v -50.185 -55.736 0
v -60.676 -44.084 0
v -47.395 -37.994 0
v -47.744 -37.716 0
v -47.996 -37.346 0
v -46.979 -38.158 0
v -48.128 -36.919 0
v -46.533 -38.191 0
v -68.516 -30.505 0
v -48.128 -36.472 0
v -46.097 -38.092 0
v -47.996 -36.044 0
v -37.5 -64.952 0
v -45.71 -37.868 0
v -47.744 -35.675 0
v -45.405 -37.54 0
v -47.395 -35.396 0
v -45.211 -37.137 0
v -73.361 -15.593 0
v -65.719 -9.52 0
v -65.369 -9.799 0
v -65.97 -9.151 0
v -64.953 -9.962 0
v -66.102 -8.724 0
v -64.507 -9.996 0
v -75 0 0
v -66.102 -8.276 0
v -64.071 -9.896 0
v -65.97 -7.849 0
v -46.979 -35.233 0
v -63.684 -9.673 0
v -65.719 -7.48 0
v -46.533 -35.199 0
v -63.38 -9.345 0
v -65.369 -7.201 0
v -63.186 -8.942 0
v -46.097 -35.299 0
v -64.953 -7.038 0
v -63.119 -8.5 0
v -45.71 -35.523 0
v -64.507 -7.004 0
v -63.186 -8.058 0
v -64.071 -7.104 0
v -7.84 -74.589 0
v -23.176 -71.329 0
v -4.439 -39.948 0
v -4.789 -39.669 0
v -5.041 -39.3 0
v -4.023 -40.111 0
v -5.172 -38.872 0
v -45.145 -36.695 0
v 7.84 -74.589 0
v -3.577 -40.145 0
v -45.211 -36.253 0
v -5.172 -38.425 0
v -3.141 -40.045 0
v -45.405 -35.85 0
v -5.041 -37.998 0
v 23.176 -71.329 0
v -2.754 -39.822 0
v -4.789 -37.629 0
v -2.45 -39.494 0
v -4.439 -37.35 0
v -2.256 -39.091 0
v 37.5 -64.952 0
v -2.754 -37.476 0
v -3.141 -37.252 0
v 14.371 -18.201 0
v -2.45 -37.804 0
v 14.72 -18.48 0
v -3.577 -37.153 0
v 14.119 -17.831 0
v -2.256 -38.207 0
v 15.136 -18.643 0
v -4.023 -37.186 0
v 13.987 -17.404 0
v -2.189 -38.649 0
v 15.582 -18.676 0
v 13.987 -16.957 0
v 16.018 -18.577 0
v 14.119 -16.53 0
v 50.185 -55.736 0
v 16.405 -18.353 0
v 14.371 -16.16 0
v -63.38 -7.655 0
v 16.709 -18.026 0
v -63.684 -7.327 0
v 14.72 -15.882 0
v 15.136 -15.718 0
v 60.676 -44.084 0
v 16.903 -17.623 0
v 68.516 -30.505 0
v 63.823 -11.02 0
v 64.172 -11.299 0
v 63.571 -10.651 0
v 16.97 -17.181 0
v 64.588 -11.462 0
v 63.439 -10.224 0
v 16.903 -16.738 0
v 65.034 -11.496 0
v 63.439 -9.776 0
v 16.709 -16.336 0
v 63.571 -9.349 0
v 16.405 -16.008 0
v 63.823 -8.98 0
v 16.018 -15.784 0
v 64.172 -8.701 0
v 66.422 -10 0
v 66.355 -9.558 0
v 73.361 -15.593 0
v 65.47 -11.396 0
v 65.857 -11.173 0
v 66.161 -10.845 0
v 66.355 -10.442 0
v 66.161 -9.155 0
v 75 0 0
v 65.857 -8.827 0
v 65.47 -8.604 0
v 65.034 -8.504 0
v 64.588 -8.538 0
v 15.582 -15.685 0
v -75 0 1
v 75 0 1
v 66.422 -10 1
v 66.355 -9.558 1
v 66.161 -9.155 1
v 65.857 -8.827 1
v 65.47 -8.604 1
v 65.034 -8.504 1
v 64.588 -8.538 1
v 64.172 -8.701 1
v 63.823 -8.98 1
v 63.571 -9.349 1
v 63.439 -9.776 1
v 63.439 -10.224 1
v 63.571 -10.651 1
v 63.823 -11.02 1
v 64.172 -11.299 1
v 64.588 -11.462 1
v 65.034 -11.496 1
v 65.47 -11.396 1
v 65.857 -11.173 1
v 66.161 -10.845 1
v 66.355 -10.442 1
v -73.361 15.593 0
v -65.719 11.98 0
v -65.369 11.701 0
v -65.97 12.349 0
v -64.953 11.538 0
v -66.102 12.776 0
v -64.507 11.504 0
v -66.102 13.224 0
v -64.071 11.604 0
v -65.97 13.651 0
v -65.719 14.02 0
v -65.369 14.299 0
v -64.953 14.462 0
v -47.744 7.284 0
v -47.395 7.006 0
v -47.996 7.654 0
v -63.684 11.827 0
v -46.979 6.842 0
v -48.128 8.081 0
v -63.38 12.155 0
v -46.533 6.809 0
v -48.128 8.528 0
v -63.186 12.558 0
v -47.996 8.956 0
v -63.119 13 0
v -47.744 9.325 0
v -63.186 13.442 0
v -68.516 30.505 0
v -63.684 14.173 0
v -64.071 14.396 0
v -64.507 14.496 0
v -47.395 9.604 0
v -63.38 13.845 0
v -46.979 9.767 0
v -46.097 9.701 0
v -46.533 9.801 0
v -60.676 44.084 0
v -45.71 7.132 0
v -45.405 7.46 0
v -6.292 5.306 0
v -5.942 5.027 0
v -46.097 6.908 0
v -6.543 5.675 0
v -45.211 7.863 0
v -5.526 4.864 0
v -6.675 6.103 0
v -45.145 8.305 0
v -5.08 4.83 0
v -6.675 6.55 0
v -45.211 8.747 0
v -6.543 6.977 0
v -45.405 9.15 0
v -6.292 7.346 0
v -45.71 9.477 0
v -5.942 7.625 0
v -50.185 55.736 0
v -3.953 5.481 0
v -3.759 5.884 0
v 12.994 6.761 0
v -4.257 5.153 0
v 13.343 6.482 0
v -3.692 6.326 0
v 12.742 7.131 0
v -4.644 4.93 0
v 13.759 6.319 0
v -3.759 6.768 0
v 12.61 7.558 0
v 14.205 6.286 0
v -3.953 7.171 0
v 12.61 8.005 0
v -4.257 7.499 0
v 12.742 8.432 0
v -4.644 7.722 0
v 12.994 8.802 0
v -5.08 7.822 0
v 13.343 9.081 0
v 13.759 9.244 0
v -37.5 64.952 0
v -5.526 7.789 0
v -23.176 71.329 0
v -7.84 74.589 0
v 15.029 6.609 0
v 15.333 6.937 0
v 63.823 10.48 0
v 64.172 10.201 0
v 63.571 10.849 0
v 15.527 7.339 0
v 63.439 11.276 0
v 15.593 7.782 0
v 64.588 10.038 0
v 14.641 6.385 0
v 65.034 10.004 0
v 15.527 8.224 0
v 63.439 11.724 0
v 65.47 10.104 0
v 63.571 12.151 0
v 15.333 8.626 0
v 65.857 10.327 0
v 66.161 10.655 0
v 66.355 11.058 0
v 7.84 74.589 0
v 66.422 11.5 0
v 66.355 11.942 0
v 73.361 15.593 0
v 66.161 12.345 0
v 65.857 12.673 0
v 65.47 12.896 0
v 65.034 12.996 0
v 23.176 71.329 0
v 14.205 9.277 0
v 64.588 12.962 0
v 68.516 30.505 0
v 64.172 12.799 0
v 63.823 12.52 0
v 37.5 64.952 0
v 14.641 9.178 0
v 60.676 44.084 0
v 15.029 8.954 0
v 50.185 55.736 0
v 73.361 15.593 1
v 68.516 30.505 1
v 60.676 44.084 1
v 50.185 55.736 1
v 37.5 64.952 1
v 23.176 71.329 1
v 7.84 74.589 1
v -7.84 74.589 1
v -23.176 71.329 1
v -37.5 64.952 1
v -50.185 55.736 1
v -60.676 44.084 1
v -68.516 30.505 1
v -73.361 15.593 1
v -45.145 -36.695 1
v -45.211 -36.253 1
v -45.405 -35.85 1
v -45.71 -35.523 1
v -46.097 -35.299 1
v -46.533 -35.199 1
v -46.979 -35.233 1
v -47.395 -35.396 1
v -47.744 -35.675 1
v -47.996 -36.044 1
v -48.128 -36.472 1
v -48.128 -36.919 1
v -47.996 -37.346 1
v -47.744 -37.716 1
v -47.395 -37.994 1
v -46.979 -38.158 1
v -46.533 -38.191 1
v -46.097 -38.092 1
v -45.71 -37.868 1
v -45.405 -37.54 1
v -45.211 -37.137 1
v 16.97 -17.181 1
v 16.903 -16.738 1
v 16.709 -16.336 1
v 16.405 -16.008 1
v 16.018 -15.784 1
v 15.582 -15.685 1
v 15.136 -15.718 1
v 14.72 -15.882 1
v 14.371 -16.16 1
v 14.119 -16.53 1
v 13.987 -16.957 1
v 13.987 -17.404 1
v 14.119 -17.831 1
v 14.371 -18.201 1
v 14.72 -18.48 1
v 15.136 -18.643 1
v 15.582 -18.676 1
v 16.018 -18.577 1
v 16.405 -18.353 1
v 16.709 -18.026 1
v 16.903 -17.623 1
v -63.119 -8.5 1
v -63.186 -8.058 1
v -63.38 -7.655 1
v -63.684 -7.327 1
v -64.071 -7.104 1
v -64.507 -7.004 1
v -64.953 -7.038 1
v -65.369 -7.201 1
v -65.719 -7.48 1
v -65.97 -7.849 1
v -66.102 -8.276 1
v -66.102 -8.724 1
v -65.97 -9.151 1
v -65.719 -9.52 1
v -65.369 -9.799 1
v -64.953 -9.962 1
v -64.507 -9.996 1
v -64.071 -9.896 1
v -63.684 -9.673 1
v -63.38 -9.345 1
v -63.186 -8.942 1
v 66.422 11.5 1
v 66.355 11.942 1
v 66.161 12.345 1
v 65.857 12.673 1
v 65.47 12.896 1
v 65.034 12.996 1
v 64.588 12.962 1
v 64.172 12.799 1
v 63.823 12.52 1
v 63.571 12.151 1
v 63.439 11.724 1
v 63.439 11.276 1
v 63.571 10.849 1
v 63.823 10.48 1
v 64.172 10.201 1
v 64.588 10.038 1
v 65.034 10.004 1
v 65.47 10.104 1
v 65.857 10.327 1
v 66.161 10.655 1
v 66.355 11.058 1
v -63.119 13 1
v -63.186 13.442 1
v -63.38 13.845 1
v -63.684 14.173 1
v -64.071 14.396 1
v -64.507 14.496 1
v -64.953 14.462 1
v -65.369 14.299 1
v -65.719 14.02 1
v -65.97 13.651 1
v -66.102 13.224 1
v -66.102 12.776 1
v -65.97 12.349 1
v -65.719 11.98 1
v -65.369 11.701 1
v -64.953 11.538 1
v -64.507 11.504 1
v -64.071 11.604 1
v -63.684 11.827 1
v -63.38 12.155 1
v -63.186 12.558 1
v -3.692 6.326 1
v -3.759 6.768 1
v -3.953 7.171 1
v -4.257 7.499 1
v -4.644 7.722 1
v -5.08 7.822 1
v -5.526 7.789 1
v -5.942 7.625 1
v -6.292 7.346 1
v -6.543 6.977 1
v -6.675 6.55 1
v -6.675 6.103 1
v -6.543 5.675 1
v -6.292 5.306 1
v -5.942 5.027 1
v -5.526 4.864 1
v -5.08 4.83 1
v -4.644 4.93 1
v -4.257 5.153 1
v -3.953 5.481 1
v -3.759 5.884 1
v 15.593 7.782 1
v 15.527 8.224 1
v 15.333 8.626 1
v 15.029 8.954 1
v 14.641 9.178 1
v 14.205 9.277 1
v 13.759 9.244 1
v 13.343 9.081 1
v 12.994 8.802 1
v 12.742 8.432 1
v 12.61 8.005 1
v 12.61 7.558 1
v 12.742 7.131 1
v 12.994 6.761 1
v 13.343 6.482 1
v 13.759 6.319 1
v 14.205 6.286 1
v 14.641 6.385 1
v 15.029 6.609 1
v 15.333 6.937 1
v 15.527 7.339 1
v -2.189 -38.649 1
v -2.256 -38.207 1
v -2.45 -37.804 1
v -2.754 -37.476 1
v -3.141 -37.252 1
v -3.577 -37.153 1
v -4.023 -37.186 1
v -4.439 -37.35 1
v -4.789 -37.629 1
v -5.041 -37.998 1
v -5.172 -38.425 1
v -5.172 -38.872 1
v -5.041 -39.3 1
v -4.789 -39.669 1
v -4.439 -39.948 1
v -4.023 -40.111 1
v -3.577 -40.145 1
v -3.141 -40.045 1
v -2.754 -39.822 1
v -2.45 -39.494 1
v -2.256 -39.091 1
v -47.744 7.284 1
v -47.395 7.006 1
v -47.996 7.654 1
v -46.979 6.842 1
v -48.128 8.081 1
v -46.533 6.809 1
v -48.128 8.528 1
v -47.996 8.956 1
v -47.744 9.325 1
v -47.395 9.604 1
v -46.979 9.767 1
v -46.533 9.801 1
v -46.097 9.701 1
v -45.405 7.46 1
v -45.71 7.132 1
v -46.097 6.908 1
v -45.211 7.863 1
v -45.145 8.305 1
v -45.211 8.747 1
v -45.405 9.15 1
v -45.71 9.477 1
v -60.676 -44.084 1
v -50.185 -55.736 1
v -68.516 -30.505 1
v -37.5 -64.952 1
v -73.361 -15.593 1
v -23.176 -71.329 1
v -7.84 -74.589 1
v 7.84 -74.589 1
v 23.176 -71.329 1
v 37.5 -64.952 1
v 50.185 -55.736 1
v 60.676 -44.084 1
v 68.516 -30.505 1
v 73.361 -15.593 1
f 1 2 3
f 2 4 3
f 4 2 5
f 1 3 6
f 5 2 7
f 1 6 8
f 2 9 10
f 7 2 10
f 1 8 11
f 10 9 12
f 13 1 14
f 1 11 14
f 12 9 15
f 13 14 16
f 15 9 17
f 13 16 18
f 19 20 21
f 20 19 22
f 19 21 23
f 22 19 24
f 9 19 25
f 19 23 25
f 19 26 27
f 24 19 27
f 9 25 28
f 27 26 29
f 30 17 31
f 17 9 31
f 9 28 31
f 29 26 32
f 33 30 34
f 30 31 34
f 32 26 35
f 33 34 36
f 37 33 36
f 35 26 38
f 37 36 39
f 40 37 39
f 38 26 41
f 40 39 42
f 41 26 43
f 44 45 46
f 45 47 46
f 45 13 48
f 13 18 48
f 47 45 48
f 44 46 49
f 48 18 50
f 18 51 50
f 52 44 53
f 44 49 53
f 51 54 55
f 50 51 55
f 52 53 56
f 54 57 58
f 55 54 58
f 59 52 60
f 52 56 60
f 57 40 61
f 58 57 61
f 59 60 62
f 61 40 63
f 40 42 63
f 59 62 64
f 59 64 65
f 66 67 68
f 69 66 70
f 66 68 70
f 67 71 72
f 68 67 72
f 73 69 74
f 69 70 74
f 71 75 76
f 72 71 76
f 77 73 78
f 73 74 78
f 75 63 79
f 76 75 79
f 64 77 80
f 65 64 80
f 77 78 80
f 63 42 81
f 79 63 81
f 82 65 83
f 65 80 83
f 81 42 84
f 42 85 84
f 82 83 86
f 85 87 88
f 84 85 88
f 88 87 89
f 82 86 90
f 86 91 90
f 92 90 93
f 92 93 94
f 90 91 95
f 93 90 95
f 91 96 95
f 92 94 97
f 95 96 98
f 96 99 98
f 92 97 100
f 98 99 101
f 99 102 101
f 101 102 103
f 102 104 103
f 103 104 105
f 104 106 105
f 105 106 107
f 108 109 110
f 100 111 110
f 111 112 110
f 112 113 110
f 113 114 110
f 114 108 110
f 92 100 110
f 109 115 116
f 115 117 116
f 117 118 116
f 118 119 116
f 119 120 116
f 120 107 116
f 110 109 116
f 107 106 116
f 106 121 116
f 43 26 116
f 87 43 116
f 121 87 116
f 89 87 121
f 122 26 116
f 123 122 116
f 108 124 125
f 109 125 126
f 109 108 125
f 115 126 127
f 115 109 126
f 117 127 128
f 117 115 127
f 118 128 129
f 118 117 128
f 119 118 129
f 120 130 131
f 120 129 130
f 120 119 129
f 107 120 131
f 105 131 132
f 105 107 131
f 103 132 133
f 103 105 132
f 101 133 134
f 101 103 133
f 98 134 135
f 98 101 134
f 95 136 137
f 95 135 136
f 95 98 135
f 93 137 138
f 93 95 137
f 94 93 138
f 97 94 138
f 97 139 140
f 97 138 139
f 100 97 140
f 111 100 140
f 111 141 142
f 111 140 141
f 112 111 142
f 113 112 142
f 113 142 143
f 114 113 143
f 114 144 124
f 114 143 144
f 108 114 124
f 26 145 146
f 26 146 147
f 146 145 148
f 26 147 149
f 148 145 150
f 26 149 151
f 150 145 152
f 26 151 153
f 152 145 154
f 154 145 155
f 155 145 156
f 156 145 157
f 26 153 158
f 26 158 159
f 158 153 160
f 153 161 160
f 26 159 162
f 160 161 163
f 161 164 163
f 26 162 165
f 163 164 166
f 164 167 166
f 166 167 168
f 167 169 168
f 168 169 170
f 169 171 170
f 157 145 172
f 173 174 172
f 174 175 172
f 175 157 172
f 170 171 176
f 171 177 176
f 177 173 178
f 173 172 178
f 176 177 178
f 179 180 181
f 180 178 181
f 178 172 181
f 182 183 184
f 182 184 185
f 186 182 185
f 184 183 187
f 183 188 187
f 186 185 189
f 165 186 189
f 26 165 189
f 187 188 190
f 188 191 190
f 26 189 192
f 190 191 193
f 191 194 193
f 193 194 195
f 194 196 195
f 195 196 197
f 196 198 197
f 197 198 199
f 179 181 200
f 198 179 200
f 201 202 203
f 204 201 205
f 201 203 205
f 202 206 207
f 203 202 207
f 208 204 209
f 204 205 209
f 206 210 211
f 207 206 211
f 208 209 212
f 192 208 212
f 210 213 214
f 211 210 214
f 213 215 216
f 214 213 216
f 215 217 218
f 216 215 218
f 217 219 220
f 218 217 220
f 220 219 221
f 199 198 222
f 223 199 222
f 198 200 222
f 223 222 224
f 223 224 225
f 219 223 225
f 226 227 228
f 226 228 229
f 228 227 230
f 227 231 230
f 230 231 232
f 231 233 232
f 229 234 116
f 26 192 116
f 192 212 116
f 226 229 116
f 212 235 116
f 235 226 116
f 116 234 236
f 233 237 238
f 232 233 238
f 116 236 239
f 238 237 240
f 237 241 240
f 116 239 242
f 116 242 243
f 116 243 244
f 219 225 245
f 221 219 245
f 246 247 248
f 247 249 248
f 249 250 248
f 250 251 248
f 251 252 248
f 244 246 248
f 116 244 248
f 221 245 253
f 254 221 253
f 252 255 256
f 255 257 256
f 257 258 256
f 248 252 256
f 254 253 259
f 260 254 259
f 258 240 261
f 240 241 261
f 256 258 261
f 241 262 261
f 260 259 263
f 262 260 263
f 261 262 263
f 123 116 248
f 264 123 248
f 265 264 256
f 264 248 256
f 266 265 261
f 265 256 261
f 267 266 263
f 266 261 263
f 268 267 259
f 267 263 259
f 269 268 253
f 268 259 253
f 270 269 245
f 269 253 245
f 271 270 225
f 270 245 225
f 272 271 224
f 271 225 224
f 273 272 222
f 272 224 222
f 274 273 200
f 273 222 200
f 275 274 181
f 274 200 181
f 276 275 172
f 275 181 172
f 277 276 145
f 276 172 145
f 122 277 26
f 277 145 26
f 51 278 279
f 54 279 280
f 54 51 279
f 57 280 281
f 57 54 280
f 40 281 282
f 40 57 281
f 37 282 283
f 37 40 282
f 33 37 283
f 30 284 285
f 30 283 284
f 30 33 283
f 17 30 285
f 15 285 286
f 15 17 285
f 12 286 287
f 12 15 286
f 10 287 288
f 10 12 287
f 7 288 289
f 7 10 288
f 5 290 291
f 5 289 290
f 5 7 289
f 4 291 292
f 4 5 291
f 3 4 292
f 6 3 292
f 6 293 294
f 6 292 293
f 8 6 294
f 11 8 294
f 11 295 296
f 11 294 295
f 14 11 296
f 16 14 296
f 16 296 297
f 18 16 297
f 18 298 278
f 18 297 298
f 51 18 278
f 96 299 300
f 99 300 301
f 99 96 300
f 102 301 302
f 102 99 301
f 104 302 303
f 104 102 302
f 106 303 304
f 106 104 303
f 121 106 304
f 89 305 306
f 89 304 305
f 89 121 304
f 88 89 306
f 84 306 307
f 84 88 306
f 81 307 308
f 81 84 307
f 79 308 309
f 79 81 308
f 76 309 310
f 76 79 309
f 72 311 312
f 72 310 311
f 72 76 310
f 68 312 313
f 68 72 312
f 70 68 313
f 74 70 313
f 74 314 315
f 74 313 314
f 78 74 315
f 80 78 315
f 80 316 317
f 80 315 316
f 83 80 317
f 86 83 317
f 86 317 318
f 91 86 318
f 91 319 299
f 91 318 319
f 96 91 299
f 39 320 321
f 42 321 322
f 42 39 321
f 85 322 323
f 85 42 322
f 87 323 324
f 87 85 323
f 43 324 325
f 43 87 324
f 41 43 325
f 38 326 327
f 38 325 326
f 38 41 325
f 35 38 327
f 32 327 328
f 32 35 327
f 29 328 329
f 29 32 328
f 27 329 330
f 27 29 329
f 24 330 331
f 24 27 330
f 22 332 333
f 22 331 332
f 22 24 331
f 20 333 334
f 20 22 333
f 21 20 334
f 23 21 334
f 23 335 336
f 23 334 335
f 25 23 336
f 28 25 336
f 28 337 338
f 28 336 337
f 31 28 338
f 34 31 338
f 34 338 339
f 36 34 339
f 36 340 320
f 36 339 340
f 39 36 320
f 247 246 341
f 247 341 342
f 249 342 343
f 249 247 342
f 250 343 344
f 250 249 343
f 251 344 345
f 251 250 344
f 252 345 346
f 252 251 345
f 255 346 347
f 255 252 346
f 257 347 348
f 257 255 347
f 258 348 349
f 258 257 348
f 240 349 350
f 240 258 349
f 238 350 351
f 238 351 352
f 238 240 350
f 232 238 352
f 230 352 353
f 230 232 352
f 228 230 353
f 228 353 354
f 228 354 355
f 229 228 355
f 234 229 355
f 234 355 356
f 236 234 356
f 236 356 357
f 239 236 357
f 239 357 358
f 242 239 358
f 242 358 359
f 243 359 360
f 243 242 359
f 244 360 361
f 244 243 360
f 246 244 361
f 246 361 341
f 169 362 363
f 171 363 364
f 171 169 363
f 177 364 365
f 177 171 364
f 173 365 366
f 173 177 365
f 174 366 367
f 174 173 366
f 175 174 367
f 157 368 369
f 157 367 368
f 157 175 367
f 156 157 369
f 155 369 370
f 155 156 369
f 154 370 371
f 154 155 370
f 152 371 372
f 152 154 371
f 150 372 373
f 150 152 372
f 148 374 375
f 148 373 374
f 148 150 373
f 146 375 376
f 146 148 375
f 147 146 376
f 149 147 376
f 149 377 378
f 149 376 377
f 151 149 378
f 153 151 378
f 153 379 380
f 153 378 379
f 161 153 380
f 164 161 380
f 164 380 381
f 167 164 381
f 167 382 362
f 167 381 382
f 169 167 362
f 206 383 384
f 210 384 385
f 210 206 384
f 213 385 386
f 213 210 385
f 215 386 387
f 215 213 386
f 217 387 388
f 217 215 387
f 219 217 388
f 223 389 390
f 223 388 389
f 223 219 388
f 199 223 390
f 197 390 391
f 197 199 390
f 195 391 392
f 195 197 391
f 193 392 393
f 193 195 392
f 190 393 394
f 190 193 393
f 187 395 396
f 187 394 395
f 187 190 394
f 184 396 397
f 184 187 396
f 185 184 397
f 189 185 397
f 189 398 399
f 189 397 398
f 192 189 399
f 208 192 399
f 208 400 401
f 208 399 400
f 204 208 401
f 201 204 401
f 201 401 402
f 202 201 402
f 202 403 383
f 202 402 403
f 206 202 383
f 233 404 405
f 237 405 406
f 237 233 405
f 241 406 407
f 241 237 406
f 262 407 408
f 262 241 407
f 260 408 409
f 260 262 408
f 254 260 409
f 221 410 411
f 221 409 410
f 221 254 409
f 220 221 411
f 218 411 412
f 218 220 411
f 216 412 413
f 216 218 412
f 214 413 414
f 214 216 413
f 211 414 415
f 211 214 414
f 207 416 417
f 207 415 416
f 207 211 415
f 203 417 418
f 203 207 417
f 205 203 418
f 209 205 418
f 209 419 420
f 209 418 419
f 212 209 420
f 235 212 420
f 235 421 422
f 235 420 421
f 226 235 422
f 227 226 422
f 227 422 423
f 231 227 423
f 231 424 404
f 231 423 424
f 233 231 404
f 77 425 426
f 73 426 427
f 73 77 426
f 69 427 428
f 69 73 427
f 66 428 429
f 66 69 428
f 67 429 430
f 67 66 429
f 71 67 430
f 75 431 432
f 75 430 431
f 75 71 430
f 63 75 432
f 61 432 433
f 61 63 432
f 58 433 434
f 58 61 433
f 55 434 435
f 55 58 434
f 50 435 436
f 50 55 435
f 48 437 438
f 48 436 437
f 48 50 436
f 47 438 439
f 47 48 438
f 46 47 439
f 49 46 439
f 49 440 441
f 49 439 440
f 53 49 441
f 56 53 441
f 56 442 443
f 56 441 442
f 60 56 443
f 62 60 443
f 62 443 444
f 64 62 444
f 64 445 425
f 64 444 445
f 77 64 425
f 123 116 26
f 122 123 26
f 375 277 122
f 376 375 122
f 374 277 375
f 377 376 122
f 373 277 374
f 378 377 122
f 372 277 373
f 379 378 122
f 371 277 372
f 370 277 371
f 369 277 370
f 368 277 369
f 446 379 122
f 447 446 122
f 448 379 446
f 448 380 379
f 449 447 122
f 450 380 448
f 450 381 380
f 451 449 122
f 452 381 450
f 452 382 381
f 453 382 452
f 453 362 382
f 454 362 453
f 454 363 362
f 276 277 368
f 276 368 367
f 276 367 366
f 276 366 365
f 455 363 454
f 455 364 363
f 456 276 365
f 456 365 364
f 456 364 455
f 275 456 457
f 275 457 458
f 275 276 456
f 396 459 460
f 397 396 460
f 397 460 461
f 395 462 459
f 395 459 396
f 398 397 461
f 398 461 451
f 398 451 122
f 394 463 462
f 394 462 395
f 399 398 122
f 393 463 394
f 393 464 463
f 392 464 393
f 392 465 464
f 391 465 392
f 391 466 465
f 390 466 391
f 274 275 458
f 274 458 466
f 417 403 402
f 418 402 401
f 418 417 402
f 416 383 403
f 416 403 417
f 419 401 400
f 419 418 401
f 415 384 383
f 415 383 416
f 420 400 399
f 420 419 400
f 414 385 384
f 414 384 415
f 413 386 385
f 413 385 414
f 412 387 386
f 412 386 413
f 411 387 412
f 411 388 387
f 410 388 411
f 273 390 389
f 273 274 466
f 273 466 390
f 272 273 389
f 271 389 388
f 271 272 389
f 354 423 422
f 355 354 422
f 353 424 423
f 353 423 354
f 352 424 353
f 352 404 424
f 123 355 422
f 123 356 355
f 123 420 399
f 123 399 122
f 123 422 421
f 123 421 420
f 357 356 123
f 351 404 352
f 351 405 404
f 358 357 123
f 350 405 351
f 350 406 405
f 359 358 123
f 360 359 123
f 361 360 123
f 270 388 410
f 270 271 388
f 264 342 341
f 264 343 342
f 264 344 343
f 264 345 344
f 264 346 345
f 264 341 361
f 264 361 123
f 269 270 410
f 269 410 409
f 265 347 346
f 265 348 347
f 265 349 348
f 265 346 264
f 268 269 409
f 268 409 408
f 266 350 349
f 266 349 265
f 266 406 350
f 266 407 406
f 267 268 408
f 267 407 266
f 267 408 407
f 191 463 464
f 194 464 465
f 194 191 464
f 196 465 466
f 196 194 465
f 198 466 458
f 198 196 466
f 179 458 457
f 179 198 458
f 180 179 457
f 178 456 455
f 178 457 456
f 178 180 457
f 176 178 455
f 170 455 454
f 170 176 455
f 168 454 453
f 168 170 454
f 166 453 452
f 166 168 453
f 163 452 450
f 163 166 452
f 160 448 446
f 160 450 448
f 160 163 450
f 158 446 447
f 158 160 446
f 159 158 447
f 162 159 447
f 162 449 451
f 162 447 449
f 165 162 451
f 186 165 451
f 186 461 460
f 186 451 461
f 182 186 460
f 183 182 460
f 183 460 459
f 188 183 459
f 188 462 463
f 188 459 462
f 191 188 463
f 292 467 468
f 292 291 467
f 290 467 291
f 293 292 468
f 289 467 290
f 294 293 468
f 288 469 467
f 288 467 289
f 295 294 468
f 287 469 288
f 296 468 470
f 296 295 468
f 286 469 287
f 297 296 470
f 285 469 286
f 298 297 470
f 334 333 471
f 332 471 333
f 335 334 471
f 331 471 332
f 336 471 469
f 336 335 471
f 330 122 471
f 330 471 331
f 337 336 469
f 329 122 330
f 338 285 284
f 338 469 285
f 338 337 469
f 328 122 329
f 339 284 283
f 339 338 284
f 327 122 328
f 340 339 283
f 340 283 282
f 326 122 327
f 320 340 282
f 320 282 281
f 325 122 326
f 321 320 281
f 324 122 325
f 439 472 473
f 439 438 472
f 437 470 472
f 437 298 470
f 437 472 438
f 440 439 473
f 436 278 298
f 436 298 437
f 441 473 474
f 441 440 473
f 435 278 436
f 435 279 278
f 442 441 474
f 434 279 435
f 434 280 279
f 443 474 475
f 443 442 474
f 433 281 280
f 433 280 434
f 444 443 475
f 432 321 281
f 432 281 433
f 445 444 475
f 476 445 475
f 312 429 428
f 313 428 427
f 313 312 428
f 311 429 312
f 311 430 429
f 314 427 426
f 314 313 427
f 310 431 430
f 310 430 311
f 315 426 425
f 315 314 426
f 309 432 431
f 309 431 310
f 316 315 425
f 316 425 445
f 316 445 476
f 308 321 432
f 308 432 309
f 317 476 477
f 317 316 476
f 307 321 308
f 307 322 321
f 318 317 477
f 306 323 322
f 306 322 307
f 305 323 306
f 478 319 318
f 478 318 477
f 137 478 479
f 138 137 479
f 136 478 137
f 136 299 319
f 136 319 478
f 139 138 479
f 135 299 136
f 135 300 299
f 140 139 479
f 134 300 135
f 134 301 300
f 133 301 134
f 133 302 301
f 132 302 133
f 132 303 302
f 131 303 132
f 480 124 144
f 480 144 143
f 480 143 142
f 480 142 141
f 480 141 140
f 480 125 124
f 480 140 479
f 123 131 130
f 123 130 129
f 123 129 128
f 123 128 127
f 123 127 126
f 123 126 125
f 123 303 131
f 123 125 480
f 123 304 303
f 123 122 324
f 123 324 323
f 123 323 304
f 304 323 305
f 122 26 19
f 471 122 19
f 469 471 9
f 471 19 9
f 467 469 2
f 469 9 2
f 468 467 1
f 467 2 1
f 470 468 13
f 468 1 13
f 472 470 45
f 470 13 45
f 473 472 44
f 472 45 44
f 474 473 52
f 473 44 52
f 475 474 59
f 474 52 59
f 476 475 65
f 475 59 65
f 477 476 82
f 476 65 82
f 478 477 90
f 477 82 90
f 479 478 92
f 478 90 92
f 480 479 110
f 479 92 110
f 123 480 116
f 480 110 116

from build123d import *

# Parameters (mm, degrees)
F5_DEPTH = 1
F1_R     = 1.5
F3_R     = 1.5
F4_R     = 1.5
F2_R     = 1.5
F6_DEPTH = 5
F7_DEPTH = 25


with BuildPart() as f5:
    # F0 (on Top) → F5 (new body)
    with BuildSketch(Plane.XY):
        with BuildLine():
            ThreePointArc((-75, 0), (0, -75), (75, 0))
            Line((75, 0), (0, 0))
            Line((0, 0), (-75, 0))
        make_face()
    extrude(amount=F5_DEPTH)


with BuildPart() as f5b:
    # F1 (on face) → F5, piece 2 (new body)
    with BuildSketch(Plane.XY):
        with BuildLine():
            Line((-75, 0), (0, 0))
            Line((0, 0), (75, 0))
            ThreePointArc((75, 0), (0, 75), (-75, 0))
        make_face()
        with Locations((64.9220868945, 11.5)):
            Circle(F1_R, mode=Mode.SUBTRACT)
    extrude(amount=F5_DEPTH)


with BuildPart() as f6_tool:
    # F3 (on face) + F4 (on face) + F2 (on face) → F6 (new body)
    with BuildSketch(Plane.XY):
        with Locations((14.0932742506, 7.7815055847)):
            Circle(F3_R)
        with Locations((15.470101073, -17.1805525817)):
            Circle(F3_R)
    with BuildSketch(Plane.XY):
        with Locations((-46.644795686, 8.3047393709)):
            Circle(F4_R)
        with Locations((-5.1919909365, 6.3261089357)):
            Circle(F4_R)
        with Locations((-46.644795686, -36.6952606291)):
            Circle(F4_R)
        with Locations((-3.6891939548, -38.6487907444)):
            Circle(F4_R)
    with BuildSketch(Plane.XY):
        with Locations((-64.618964936, 13)):
            Circle(F2_R)
        with Locations((-64.618964936, -8.5)):
            Circle(F2_R)
    extrude(amount=F6_DEPTH)


with BuildPart() as f5_1:
    add(f5.part)

    # F6: cut by f6_tool
    add(f6_tool.part, mode=Mode.SUBTRACT)

    # F1 (on face) → F7 (cut)
    with BuildSketch(Plane.XY):
        with Locations((64.9220868945, 11.5)):
            Circle(F1_R)
        with Locations((64.9220868945, -10)):
            Circle(F1_R)
    extrude(amount=F7_DEPTH, mode=Mode.SUBTRACT)


with BuildPart() as f5b_1:
    add(f5b.part)

    # F6: cut by f6_tool
    add(f6_tool.part, mode=Mode.SUBTRACT)


solid = Compound([f5_1.part, f5b_1.part])
